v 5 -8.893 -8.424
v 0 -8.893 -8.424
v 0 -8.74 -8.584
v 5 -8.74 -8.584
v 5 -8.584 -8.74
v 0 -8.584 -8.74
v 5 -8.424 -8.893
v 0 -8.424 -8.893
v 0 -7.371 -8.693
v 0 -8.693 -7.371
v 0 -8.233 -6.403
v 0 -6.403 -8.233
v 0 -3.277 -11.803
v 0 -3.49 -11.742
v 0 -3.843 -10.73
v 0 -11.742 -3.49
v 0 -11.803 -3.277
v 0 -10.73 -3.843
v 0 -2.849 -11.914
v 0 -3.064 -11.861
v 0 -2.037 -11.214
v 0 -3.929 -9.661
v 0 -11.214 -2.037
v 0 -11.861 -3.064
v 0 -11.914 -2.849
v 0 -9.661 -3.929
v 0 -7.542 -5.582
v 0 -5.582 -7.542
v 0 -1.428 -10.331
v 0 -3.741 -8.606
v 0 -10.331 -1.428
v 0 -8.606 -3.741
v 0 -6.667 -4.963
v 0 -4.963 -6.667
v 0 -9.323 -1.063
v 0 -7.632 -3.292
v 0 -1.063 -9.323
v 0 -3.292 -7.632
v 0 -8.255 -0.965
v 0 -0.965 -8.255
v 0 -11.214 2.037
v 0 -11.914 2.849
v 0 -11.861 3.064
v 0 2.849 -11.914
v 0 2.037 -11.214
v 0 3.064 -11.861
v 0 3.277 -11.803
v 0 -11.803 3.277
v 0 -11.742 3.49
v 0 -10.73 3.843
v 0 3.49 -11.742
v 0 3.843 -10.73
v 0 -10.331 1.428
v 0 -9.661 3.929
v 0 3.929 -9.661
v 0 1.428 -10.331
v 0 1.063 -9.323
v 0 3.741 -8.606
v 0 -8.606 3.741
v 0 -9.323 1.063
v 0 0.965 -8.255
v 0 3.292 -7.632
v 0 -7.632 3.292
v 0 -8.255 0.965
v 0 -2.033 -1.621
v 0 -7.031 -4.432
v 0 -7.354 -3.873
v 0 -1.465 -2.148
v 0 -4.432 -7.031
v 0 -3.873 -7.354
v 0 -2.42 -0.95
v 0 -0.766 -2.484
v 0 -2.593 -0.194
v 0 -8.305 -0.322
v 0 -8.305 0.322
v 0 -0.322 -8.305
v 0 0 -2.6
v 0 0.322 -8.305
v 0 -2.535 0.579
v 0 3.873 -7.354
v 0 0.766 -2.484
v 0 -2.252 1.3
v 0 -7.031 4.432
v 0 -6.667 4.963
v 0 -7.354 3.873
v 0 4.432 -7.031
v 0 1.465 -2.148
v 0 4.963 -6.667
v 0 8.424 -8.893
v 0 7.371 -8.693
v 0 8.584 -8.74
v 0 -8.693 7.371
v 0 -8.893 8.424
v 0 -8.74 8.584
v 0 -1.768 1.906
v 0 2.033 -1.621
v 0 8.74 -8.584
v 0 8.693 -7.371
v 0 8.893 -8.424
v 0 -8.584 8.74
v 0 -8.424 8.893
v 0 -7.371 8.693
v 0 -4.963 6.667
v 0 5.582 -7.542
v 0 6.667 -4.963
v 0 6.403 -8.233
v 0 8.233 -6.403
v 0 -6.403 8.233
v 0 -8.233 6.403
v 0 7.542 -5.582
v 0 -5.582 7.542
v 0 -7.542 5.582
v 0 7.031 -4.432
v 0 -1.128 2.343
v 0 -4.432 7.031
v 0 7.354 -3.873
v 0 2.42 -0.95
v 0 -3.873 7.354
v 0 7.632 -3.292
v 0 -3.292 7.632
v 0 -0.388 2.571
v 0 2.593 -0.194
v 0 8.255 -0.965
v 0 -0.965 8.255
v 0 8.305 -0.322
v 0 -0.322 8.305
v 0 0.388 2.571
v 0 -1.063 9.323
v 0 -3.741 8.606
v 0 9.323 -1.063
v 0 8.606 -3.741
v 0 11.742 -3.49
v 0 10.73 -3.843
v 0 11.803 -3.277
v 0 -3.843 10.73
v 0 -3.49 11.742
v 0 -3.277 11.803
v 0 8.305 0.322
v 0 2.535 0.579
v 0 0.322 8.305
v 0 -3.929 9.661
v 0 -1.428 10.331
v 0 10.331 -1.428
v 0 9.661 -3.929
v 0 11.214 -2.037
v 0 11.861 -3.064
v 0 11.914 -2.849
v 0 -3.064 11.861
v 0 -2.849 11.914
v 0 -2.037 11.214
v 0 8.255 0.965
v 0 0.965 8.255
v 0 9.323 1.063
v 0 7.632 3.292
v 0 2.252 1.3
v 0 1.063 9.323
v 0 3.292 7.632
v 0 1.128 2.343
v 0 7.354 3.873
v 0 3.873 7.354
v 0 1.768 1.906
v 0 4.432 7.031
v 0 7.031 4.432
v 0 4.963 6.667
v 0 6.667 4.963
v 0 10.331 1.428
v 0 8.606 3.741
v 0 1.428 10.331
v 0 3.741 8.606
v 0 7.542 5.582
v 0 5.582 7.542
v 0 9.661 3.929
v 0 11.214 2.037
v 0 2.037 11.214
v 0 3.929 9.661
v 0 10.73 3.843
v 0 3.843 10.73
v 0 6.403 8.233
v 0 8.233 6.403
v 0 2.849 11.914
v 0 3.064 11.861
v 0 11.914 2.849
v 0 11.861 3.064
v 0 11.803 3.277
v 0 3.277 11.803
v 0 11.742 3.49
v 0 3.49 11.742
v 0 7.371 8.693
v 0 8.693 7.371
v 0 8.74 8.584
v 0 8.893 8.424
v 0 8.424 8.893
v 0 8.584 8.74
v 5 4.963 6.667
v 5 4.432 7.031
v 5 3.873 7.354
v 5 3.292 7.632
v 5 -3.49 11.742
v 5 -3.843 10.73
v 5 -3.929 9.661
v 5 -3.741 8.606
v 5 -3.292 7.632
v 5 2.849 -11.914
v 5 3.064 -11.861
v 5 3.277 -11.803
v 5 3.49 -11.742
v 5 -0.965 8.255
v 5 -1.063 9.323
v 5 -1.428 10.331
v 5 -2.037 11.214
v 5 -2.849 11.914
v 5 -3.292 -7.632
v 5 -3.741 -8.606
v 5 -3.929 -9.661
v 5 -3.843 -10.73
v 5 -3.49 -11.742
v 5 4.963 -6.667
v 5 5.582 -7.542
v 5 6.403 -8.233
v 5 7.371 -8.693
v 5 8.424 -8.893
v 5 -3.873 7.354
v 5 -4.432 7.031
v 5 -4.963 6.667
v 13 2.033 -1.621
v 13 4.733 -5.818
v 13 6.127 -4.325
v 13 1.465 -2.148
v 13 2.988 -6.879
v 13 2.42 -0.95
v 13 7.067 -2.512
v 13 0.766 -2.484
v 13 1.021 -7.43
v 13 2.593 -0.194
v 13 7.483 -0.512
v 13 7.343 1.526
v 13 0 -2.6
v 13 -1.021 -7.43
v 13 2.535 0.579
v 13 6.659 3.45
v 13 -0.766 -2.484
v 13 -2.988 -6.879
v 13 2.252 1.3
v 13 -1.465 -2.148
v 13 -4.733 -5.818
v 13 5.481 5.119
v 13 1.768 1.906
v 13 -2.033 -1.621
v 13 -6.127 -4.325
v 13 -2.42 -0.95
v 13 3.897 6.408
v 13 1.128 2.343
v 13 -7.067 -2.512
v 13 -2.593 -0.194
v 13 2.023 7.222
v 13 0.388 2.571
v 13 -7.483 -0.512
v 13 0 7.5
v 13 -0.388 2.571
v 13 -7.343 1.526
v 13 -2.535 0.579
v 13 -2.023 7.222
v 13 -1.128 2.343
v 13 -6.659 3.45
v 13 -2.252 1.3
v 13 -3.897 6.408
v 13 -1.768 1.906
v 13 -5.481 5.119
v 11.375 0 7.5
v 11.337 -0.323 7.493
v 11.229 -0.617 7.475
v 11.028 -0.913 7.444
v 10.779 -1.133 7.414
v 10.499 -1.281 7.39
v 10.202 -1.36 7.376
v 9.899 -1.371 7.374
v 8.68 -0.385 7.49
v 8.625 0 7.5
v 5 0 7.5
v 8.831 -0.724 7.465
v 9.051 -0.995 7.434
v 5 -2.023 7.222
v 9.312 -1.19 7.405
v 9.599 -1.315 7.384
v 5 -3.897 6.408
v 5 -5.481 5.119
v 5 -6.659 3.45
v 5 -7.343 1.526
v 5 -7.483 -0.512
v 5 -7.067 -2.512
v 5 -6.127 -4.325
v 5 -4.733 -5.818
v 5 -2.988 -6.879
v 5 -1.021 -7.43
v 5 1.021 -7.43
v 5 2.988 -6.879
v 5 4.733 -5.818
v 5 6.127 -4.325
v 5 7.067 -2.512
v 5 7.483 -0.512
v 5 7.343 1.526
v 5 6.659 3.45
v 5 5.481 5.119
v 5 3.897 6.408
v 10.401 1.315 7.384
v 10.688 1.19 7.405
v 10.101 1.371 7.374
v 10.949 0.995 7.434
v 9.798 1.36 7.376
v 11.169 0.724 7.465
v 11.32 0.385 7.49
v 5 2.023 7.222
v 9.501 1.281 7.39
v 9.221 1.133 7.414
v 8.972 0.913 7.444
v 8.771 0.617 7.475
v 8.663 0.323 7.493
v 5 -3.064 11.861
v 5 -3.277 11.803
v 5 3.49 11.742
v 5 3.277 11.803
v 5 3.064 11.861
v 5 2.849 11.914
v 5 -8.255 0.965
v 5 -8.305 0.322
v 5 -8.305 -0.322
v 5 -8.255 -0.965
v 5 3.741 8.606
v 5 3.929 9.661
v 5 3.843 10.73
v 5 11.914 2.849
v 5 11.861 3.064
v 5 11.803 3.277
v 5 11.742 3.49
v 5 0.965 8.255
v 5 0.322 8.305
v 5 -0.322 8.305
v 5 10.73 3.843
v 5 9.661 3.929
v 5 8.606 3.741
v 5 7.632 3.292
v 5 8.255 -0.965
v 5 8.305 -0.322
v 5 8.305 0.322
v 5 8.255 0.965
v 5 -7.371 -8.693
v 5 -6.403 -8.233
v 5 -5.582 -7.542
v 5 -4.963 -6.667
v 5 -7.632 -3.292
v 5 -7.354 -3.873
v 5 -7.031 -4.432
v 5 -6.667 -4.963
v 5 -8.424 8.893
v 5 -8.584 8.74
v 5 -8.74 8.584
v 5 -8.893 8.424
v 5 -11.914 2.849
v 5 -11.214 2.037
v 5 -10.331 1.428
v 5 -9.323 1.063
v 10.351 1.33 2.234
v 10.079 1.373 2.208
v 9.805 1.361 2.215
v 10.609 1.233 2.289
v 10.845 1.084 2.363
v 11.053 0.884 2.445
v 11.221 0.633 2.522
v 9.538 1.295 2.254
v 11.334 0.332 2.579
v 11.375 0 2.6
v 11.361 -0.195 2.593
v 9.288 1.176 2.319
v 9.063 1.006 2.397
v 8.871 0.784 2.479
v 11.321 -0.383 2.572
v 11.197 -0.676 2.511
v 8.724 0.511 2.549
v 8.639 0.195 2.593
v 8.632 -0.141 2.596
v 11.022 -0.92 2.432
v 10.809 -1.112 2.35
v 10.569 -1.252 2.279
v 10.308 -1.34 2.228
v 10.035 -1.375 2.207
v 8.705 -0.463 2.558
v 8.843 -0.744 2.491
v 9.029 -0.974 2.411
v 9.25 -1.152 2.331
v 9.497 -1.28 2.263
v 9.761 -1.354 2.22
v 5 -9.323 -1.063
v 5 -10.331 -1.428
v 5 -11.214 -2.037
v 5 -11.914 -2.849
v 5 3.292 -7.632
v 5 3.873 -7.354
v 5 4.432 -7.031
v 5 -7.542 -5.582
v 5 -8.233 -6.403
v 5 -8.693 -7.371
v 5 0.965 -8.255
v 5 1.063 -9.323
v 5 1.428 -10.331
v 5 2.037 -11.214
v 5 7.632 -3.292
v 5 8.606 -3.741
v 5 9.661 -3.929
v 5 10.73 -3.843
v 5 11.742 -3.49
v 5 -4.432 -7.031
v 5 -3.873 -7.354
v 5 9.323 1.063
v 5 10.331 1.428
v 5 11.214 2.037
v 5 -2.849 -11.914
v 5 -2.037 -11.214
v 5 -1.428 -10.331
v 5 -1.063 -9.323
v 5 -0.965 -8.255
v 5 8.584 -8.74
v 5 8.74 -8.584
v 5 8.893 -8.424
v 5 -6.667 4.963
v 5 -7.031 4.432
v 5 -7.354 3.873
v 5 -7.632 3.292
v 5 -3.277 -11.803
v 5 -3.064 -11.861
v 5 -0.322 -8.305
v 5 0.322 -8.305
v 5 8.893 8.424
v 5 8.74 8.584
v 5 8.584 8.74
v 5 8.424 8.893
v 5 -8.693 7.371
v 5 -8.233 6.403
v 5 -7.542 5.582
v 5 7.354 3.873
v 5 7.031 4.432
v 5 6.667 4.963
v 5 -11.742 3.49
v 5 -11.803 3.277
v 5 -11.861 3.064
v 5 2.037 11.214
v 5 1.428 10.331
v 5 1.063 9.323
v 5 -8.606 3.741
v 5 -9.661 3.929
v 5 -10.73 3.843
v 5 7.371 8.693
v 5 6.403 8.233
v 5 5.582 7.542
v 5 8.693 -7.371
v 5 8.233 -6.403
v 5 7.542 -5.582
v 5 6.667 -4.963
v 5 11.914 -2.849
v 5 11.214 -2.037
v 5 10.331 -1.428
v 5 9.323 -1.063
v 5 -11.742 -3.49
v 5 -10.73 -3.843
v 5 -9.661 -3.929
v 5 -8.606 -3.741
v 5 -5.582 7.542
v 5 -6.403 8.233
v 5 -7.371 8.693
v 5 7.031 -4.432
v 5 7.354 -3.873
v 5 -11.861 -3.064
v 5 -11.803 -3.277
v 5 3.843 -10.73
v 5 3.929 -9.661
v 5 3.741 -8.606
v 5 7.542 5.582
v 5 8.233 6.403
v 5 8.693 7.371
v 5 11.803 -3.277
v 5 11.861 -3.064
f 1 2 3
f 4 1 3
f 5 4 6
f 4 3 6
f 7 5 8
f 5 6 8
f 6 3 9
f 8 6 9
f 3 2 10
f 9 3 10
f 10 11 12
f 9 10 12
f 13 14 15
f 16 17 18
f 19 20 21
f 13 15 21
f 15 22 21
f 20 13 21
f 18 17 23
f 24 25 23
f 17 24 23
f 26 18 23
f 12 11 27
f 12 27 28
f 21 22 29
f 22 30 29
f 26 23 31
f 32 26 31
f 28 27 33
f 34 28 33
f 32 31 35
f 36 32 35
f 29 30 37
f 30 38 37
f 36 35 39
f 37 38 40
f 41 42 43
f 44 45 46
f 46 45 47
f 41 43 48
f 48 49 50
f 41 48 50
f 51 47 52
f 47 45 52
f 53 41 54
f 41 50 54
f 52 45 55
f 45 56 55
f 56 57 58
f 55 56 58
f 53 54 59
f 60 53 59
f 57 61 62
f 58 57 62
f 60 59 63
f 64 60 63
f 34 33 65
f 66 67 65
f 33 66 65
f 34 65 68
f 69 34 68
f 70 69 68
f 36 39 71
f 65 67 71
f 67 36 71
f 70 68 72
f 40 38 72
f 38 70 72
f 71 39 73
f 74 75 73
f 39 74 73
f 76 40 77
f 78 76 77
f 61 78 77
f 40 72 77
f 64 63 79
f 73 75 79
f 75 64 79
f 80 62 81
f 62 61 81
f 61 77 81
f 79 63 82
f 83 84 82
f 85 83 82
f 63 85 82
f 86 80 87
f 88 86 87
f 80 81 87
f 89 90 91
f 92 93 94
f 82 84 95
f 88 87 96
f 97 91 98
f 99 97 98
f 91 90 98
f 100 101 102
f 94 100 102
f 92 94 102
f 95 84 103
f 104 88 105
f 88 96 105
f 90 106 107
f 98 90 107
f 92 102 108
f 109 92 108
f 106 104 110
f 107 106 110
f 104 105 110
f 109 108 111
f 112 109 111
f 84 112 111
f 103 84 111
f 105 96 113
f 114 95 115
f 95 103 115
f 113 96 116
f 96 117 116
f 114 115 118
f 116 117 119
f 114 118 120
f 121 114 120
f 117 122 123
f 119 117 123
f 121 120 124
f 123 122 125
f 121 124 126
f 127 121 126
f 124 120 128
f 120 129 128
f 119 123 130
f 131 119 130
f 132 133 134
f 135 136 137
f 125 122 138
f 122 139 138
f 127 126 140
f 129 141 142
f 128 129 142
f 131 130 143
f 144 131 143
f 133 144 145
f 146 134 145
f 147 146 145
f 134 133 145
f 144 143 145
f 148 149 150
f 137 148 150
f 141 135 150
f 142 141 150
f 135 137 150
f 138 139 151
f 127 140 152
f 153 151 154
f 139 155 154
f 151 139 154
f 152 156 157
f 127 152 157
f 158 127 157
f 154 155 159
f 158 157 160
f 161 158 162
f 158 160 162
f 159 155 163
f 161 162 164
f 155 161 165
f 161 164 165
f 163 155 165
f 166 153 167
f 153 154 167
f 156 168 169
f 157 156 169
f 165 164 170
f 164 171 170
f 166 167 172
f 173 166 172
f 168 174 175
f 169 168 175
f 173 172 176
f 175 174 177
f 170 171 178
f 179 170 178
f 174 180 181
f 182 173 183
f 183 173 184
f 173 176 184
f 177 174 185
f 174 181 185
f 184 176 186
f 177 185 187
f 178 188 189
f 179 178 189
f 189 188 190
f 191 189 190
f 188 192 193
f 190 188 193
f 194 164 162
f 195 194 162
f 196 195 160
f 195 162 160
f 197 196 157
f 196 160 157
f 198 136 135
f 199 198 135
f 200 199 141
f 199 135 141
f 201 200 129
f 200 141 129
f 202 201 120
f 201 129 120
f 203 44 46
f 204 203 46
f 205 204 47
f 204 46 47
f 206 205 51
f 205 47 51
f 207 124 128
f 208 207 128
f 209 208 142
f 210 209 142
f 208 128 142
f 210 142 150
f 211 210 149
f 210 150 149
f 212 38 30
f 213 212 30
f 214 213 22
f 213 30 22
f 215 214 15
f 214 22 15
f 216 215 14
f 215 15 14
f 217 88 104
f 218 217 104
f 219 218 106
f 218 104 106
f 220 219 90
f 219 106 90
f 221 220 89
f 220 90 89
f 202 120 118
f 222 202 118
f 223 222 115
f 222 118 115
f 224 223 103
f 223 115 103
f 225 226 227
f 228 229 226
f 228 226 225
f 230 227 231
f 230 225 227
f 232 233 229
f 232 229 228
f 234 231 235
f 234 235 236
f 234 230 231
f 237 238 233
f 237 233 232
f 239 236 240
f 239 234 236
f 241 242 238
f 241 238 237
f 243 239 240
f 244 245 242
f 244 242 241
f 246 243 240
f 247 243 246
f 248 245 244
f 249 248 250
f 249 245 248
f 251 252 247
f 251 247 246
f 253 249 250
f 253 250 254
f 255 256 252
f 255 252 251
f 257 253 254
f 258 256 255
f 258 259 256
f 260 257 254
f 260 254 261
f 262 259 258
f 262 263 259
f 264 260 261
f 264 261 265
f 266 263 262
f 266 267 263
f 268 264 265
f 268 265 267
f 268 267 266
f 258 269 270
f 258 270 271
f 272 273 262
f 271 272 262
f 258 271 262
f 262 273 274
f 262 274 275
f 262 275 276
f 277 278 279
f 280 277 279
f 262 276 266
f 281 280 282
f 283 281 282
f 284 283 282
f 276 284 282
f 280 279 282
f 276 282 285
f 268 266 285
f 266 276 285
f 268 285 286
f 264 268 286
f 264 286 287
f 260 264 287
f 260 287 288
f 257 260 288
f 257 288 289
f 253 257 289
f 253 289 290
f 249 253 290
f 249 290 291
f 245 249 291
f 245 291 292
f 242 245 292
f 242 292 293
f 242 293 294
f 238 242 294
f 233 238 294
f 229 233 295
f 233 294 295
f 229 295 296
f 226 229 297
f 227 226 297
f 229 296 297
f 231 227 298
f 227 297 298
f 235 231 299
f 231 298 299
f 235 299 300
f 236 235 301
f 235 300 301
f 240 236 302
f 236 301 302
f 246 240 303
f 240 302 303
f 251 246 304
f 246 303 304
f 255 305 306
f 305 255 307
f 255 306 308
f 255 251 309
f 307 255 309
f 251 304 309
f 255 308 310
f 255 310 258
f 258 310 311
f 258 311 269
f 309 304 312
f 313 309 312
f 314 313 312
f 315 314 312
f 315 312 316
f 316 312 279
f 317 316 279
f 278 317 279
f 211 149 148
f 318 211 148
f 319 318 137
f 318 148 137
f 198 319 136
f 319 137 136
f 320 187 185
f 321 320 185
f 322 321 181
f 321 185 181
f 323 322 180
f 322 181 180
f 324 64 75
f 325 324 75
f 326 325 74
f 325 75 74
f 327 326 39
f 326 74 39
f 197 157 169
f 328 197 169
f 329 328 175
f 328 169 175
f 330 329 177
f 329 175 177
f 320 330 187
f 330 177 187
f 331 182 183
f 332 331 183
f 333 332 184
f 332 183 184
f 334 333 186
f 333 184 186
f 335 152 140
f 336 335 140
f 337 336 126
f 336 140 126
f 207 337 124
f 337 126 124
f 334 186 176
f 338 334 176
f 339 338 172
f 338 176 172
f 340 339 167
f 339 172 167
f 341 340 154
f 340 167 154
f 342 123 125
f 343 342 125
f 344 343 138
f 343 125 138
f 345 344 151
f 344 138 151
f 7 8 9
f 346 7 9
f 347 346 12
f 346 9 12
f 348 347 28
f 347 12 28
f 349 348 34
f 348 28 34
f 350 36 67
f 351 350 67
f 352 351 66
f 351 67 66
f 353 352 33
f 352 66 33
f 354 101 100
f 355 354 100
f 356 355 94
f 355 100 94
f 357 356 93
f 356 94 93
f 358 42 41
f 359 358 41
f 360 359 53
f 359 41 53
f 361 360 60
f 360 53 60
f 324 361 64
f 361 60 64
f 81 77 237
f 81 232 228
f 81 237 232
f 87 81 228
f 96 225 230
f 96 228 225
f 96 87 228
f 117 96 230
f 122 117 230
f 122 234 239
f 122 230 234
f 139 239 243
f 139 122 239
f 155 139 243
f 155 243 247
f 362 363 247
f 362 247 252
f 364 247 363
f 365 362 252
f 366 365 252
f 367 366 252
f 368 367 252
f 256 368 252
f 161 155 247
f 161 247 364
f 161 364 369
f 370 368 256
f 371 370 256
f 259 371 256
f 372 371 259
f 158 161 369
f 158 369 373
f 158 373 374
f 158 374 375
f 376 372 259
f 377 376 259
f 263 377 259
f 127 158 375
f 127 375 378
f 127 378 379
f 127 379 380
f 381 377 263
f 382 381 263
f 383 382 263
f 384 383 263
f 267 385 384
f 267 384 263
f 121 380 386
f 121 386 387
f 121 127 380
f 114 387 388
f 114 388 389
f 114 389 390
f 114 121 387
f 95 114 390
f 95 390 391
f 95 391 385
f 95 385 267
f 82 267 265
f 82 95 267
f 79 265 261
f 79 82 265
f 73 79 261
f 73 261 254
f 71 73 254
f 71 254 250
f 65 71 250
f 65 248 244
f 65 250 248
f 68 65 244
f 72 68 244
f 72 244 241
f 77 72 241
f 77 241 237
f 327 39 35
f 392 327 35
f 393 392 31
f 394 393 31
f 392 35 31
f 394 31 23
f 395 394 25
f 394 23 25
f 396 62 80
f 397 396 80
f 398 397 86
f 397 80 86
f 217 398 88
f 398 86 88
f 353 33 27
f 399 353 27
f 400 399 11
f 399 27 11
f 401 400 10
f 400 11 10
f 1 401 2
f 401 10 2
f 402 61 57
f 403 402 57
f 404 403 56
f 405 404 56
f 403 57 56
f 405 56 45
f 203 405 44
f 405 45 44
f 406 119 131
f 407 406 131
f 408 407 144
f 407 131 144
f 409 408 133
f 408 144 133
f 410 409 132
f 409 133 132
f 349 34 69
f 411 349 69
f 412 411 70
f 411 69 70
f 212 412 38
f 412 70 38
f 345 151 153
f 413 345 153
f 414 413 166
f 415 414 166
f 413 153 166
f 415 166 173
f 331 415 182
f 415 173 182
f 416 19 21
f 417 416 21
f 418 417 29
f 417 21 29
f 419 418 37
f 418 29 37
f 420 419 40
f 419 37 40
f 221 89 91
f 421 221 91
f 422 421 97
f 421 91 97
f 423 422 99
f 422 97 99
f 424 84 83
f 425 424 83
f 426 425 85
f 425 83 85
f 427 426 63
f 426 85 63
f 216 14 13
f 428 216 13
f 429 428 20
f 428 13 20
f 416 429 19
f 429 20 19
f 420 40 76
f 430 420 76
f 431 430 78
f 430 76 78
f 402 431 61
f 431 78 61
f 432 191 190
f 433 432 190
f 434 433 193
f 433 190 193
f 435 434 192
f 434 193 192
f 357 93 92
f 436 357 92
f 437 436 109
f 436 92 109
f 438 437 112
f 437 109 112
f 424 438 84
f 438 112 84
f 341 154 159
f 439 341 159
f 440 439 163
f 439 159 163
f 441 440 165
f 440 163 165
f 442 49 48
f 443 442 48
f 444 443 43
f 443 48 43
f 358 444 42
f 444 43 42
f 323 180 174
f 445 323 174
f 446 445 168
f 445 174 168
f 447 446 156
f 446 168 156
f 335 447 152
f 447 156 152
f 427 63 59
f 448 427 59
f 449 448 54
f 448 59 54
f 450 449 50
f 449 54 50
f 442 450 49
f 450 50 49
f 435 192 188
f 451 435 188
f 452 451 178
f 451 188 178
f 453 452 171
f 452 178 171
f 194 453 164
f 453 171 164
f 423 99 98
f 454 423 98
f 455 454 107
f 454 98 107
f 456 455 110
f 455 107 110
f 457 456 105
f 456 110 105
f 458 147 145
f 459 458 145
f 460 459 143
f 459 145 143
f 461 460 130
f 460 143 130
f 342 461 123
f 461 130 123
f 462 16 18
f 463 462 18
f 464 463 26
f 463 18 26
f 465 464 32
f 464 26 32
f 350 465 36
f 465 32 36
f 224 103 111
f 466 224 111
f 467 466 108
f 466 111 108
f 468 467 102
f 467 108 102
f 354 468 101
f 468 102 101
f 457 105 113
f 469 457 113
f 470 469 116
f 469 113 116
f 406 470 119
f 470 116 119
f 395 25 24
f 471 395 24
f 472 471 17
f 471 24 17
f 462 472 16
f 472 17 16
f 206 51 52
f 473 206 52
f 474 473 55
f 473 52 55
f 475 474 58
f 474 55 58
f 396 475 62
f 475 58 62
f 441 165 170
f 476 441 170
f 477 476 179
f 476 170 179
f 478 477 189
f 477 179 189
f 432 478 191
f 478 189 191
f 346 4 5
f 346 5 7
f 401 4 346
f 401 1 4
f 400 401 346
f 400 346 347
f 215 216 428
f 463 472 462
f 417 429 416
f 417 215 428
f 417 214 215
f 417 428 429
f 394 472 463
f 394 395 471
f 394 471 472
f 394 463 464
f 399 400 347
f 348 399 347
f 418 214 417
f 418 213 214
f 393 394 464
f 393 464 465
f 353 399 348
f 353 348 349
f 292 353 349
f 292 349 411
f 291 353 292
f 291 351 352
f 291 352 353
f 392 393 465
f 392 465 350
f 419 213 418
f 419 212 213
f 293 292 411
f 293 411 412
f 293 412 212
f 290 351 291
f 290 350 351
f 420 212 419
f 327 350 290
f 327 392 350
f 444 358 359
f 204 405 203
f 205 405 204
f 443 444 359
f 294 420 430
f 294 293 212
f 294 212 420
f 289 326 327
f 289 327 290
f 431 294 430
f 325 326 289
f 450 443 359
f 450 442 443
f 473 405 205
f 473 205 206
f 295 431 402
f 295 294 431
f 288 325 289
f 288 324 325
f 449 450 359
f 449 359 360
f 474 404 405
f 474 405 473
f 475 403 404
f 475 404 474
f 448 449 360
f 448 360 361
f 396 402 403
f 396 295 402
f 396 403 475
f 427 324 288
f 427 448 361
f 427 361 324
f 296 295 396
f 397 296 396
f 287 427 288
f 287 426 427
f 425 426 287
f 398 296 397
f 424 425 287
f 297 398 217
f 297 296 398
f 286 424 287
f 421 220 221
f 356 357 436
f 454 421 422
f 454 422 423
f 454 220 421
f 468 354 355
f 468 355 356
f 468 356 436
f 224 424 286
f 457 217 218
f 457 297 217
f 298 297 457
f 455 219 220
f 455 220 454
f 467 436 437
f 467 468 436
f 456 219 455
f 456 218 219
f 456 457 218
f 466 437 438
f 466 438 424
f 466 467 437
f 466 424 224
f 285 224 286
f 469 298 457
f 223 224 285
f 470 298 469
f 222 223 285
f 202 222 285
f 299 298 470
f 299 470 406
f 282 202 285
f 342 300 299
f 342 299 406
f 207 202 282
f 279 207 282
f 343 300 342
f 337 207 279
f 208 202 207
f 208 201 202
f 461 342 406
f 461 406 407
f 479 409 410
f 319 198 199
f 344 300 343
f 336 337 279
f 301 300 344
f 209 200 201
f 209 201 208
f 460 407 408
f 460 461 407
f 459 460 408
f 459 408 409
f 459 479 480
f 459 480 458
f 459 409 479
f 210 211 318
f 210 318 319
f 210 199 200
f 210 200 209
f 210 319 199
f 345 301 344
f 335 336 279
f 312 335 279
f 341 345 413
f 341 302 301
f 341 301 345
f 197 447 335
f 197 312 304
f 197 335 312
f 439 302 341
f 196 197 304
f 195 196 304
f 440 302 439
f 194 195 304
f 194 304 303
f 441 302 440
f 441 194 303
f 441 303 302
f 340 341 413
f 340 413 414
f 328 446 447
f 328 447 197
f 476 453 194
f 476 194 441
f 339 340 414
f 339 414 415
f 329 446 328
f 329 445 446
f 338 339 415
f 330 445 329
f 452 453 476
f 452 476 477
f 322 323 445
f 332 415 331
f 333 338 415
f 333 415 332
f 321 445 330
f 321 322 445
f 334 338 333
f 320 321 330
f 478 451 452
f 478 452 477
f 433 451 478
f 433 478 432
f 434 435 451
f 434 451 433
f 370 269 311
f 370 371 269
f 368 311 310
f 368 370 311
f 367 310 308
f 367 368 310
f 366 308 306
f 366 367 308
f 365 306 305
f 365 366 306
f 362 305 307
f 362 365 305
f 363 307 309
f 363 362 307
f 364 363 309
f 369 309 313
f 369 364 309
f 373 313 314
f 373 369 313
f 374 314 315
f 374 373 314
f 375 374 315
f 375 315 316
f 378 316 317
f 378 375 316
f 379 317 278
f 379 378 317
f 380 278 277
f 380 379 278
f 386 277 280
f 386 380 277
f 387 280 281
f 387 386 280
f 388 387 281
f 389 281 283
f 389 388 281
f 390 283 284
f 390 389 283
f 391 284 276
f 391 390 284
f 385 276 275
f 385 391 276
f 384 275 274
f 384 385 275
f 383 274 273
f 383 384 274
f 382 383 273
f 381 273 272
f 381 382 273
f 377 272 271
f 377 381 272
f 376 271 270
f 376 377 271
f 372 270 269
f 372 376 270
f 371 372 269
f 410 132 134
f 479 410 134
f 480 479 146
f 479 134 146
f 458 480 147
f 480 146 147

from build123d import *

# Parameters (mm, degrees)
METRIC_SPUR_GEAR_1_75M_12T_20PA_5FW_OU_R  = 2.5
METRIC_SPUR_GEAR_1_75M_12T_20PA_5FW_DEPTH = 5
SKETCH2_R                                 = 7.5
SKETCH2_R_2                               = 2.5
BOSS_EXTRUDE1_DEPTH                       = 13
SKETCH3_R                                 = 1.375
CUT_EXTRUDE1_DEPTH                        = 13
CUT_EXTRUDE2_DEPTH                        = 22.281227002
CUT_EXTRUDE2_DEPTH_BACK                   = 22.281227002
SKETCH4_R                                 = 2.6


# Read off the part's stored shape, not the designer's step: Metric - Spur gear 1.75M 12T 20PA 5FW ---S12N75H50L5N
with BuildPart() as part:
    # Metric - Spur gear 1.75M 12T 20PA 5FW ou → Metric - Spur gear 1.75M 12T 20PA 5FW (new body)
    with BuildSketch(Plane.YZ):
        with BuildLine():
            ThreePointArc((8.893362097, 8.424405653), (8.66205807, 8.66205807), (8.424405653, 8.893362097))
            ThreePointArc((8.424405653, 8.893362097), (6.40252905, 8.232977147), (4.963463004, 6.666713378))
            ThreePointArc((4.963463004, 6.666713378), (4.15575, 7.197970144), (3.291811643, 7.631841741))
            ThreePointArc((3.291811643, 7.631841741), (3.928702834, 9.661241379), (3.489674675, 11.742430356))
            ThreePointArc((3.489674675, 11.742430356), (3.170533302, 11.832591372), (2.849068258, 11.914080328))
            ThreePointArc((2.849068258, 11.914080328), (1.428264232, 10.331231883), (0.965128363, 8.255274647))
            ThreePointArc((0.965128363, 8.255274647), (0, 8.3115), (-0.965128363, 8.255274647))
            ThreePointArc((-0.965128363, 8.255274647), (-1.428264232, 10.331231883), (-2.849068258, 11.914080328))
            ThreePointArc((-2.849068258, 11.914080328), (-3.170533302, 11.832591372), (-3.489674675, 11.742430356))
            ThreePointArc((-3.489674675, 11.742430356), (-3.928702834, 9.661241379), (-3.291811643, 7.631841741))
            ThreePointArc((-3.291811643, 7.631841741), (-4.15575, 7.197970144), (-4.963463004, 6.666713378))
            ThreePointArc((-4.963463004, 6.666713378), (-6.40252905, 8.232977147), (-8.424405653, 8.893362097))
            ThreePointArc((-8.424405653, 8.893362097), (-8.66205807, 8.66205807), (-8.893362097, 8.424405653))
            ThreePointArc((-8.893362097, 8.424405653), (-8.232977147, 6.40252905), (-6.666713378, 4.963463004))
            ThreePointArc((-6.666713378, 4.963463004), (-7.197970144, 4.15575), (-7.631841741, 3.291811643))
            ThreePointArc((-7.631841741, 3.291811643), (-9.661241379, 3.928702834), (-11.742430356, 3.489674675))
            ThreePointArc((-11.742430356, 3.489674675), (-11.832591372, 3.170533302), (-11.914080328, 2.849068258))
            ThreePointArc((-11.914080328, 2.849068258), (-10.331231883, 1.428264232), (-8.255274647, 0.965128363))
            ThreePointArc((-8.255274647, 0.965128363), (-8.3115, 0), (-8.255274647, -0.965128363))
            ThreePointArc((-8.255274647, -0.965128363), (-10.331231883, -1.428264232), (-11.914080328, -2.849068258))
            ThreePointArc((-11.914080328, -2.849068258), (-11.832591372, -3.170533302), (-11.742430356, -3.489674675))
            ThreePointArc((-11.742430356, -3.489674675), (-9.661241379, -3.928702834), (-7.631841741, -3.291811643))
            ThreePointArc((-7.631841741, -3.291811643), (-7.197970144, -4.15575), (-6.666713378, -4.963463004))
            ThreePointArc((-6.666713378, -4.963463004), (-8.232977147, -6.40252905), (-8.893362097, -8.424405653))
            ThreePointArc((-8.893362097, -8.424405653), (-8.66205807, -8.66205807), (-8.424405653, -8.893362097))
            ThreePointArc((-8.424405653, -8.893362097), (-6.40252905, -8.232977147), (-4.963463004, -6.666713378))
            ThreePointArc((-4.963463004, -6.666713378), (-4.15575, -7.197970144), (-3.291811643, -7.631841741))
            ThreePointArc((-3.291811643, -7.631841741), (-3.928702834, -9.661241379), (-3.489674675, -11.742430356))
            ThreePointArc((-3.489674675, -11.742430356), (-3.170533302, -11.832591372), (-2.849068258, -11.914080328))
            ThreePointArc((-2.849068258, -11.914080328), (-1.428264232, -10.331231883), (-0.965128363, -8.255274647))
            ThreePointArc((-0.965128363, -8.255274647), (0, -8.3115), (0.965128363, -8.255274647))
            ThreePointArc((0.965128363, -8.255274647), (1.428264232, -10.331231883), (2.849068258, -11.914080328))
            ThreePointArc((2.849068258, -11.914080328), (3.170533302, -11.832591372), (3.489674675, -11.742430356))
            ThreePointArc((3.489674675, -11.742430356), (3.928702834, -9.661241379), (3.291811643, -7.631841741))
            ThreePointArc((3.291811643, -7.631841741), (4.15575, -7.197970144), (4.963463004, -6.666713378))
            ThreePointArc((4.963463004, -6.666713378), (6.40252905, -8.232977147), (8.424405653, -8.893362097))
            ThreePointArc((8.424405653, -8.893362097), (8.66205807, -8.66205807), (8.893362097, -8.424405653))
            ThreePointArc((8.893362097, -8.424405653), (8.232977147, -6.40252905), (6.666713378, -4.963463004))
            ThreePointArc((6.666713378, -4.963463004), (7.197970144, -4.15575), (7.631841741, -3.291811643))
            ThreePointArc((7.631841741, -3.291811643), (9.661241379, -3.928702834), (11.742430356, -3.489674675))
            ThreePointArc((11.742430356, -3.489674675), (11.832591372, -3.170533302), (11.914080328, -2.849068258))
            ThreePointArc((11.914080328, -2.849068258), (10.331231883, -1.428264232), (8.255274647, -0.965128363))
            ThreePointArc((8.255274647, -0.965128363), (8.3115, 0), (8.255274647, 0.965128363))
            ThreePointArc((8.255274647, 0.965128363), (10.331231883, 1.428264232), (11.914080328, 2.849068258))
            ThreePointArc((11.914080328, 2.849068258), (11.832591372, 3.170533302), (11.742430356, 3.489674675))
            ThreePointArc((11.742430356, 3.489674675), (9.661241379, 3.928702834), (7.631841741, 3.291811643))
            ThreePointArc((7.631841741, 3.291811643), (7.197970144, 4.15575), (6.666713378, 4.963463004))
            ThreePointArc((6.666713378, 4.963463004), (8.232977147, 6.40252905), (8.893362097, 8.424405653))
        make_face()
        Circle(METRIC_SPUR_GEAR_1_75M_12T_20PA_5FW_OU_R, mode=Mode.SUBTRACT)
    extrude(amount=METRIC_SPUR_GEAR_1_75M_12T_20PA_5FW_DEPTH)

    # Sketch2 → Boss-Extrude1 (add)
    with BuildSketch(Plane(origin=(0, 0, 0), x_dir=(0, 0, -1), z_dir=(1, 0, 0))):
        with Locations(Location((0, 0, 0), (0, 0, 180))):
            Circle(SKETCH2_R)
        Circle(SKETCH2_R_2, mode=Mode.SUBTRACT)
    extrude(amount=BOSS_EXTRUDE1_DEPTH)

    # Sketch3 → Cut-Extrude1 (cut)
    with BuildSketch(Plane.XY):
        with Locations((10, 0)):
            Circle(SKETCH3_R)
    extrude(amount=CUT_EXTRUDE1_DEPTH, mode=Mode.SUBTRACT)

    # Sketch4 → Cut-Extrude2 (cut, two sides: drawn at the far end of the back side and taken through both)
    with BuildSketch(Plane(origin=(0, 0, 0), x_dir=(0, 0, -1), z_dir=(1, 0, 0)).offset(-CUT_EXTRUDE2_DEPTH_BACK)):
        Circle(SKETCH4_R)
    extrude(amount=CUT_EXTRUDE2_DEPTH + CUT_EXTRUDE2_DEPTH_BACK, mode=Mode.SUBTRACT)


solid = part.part
